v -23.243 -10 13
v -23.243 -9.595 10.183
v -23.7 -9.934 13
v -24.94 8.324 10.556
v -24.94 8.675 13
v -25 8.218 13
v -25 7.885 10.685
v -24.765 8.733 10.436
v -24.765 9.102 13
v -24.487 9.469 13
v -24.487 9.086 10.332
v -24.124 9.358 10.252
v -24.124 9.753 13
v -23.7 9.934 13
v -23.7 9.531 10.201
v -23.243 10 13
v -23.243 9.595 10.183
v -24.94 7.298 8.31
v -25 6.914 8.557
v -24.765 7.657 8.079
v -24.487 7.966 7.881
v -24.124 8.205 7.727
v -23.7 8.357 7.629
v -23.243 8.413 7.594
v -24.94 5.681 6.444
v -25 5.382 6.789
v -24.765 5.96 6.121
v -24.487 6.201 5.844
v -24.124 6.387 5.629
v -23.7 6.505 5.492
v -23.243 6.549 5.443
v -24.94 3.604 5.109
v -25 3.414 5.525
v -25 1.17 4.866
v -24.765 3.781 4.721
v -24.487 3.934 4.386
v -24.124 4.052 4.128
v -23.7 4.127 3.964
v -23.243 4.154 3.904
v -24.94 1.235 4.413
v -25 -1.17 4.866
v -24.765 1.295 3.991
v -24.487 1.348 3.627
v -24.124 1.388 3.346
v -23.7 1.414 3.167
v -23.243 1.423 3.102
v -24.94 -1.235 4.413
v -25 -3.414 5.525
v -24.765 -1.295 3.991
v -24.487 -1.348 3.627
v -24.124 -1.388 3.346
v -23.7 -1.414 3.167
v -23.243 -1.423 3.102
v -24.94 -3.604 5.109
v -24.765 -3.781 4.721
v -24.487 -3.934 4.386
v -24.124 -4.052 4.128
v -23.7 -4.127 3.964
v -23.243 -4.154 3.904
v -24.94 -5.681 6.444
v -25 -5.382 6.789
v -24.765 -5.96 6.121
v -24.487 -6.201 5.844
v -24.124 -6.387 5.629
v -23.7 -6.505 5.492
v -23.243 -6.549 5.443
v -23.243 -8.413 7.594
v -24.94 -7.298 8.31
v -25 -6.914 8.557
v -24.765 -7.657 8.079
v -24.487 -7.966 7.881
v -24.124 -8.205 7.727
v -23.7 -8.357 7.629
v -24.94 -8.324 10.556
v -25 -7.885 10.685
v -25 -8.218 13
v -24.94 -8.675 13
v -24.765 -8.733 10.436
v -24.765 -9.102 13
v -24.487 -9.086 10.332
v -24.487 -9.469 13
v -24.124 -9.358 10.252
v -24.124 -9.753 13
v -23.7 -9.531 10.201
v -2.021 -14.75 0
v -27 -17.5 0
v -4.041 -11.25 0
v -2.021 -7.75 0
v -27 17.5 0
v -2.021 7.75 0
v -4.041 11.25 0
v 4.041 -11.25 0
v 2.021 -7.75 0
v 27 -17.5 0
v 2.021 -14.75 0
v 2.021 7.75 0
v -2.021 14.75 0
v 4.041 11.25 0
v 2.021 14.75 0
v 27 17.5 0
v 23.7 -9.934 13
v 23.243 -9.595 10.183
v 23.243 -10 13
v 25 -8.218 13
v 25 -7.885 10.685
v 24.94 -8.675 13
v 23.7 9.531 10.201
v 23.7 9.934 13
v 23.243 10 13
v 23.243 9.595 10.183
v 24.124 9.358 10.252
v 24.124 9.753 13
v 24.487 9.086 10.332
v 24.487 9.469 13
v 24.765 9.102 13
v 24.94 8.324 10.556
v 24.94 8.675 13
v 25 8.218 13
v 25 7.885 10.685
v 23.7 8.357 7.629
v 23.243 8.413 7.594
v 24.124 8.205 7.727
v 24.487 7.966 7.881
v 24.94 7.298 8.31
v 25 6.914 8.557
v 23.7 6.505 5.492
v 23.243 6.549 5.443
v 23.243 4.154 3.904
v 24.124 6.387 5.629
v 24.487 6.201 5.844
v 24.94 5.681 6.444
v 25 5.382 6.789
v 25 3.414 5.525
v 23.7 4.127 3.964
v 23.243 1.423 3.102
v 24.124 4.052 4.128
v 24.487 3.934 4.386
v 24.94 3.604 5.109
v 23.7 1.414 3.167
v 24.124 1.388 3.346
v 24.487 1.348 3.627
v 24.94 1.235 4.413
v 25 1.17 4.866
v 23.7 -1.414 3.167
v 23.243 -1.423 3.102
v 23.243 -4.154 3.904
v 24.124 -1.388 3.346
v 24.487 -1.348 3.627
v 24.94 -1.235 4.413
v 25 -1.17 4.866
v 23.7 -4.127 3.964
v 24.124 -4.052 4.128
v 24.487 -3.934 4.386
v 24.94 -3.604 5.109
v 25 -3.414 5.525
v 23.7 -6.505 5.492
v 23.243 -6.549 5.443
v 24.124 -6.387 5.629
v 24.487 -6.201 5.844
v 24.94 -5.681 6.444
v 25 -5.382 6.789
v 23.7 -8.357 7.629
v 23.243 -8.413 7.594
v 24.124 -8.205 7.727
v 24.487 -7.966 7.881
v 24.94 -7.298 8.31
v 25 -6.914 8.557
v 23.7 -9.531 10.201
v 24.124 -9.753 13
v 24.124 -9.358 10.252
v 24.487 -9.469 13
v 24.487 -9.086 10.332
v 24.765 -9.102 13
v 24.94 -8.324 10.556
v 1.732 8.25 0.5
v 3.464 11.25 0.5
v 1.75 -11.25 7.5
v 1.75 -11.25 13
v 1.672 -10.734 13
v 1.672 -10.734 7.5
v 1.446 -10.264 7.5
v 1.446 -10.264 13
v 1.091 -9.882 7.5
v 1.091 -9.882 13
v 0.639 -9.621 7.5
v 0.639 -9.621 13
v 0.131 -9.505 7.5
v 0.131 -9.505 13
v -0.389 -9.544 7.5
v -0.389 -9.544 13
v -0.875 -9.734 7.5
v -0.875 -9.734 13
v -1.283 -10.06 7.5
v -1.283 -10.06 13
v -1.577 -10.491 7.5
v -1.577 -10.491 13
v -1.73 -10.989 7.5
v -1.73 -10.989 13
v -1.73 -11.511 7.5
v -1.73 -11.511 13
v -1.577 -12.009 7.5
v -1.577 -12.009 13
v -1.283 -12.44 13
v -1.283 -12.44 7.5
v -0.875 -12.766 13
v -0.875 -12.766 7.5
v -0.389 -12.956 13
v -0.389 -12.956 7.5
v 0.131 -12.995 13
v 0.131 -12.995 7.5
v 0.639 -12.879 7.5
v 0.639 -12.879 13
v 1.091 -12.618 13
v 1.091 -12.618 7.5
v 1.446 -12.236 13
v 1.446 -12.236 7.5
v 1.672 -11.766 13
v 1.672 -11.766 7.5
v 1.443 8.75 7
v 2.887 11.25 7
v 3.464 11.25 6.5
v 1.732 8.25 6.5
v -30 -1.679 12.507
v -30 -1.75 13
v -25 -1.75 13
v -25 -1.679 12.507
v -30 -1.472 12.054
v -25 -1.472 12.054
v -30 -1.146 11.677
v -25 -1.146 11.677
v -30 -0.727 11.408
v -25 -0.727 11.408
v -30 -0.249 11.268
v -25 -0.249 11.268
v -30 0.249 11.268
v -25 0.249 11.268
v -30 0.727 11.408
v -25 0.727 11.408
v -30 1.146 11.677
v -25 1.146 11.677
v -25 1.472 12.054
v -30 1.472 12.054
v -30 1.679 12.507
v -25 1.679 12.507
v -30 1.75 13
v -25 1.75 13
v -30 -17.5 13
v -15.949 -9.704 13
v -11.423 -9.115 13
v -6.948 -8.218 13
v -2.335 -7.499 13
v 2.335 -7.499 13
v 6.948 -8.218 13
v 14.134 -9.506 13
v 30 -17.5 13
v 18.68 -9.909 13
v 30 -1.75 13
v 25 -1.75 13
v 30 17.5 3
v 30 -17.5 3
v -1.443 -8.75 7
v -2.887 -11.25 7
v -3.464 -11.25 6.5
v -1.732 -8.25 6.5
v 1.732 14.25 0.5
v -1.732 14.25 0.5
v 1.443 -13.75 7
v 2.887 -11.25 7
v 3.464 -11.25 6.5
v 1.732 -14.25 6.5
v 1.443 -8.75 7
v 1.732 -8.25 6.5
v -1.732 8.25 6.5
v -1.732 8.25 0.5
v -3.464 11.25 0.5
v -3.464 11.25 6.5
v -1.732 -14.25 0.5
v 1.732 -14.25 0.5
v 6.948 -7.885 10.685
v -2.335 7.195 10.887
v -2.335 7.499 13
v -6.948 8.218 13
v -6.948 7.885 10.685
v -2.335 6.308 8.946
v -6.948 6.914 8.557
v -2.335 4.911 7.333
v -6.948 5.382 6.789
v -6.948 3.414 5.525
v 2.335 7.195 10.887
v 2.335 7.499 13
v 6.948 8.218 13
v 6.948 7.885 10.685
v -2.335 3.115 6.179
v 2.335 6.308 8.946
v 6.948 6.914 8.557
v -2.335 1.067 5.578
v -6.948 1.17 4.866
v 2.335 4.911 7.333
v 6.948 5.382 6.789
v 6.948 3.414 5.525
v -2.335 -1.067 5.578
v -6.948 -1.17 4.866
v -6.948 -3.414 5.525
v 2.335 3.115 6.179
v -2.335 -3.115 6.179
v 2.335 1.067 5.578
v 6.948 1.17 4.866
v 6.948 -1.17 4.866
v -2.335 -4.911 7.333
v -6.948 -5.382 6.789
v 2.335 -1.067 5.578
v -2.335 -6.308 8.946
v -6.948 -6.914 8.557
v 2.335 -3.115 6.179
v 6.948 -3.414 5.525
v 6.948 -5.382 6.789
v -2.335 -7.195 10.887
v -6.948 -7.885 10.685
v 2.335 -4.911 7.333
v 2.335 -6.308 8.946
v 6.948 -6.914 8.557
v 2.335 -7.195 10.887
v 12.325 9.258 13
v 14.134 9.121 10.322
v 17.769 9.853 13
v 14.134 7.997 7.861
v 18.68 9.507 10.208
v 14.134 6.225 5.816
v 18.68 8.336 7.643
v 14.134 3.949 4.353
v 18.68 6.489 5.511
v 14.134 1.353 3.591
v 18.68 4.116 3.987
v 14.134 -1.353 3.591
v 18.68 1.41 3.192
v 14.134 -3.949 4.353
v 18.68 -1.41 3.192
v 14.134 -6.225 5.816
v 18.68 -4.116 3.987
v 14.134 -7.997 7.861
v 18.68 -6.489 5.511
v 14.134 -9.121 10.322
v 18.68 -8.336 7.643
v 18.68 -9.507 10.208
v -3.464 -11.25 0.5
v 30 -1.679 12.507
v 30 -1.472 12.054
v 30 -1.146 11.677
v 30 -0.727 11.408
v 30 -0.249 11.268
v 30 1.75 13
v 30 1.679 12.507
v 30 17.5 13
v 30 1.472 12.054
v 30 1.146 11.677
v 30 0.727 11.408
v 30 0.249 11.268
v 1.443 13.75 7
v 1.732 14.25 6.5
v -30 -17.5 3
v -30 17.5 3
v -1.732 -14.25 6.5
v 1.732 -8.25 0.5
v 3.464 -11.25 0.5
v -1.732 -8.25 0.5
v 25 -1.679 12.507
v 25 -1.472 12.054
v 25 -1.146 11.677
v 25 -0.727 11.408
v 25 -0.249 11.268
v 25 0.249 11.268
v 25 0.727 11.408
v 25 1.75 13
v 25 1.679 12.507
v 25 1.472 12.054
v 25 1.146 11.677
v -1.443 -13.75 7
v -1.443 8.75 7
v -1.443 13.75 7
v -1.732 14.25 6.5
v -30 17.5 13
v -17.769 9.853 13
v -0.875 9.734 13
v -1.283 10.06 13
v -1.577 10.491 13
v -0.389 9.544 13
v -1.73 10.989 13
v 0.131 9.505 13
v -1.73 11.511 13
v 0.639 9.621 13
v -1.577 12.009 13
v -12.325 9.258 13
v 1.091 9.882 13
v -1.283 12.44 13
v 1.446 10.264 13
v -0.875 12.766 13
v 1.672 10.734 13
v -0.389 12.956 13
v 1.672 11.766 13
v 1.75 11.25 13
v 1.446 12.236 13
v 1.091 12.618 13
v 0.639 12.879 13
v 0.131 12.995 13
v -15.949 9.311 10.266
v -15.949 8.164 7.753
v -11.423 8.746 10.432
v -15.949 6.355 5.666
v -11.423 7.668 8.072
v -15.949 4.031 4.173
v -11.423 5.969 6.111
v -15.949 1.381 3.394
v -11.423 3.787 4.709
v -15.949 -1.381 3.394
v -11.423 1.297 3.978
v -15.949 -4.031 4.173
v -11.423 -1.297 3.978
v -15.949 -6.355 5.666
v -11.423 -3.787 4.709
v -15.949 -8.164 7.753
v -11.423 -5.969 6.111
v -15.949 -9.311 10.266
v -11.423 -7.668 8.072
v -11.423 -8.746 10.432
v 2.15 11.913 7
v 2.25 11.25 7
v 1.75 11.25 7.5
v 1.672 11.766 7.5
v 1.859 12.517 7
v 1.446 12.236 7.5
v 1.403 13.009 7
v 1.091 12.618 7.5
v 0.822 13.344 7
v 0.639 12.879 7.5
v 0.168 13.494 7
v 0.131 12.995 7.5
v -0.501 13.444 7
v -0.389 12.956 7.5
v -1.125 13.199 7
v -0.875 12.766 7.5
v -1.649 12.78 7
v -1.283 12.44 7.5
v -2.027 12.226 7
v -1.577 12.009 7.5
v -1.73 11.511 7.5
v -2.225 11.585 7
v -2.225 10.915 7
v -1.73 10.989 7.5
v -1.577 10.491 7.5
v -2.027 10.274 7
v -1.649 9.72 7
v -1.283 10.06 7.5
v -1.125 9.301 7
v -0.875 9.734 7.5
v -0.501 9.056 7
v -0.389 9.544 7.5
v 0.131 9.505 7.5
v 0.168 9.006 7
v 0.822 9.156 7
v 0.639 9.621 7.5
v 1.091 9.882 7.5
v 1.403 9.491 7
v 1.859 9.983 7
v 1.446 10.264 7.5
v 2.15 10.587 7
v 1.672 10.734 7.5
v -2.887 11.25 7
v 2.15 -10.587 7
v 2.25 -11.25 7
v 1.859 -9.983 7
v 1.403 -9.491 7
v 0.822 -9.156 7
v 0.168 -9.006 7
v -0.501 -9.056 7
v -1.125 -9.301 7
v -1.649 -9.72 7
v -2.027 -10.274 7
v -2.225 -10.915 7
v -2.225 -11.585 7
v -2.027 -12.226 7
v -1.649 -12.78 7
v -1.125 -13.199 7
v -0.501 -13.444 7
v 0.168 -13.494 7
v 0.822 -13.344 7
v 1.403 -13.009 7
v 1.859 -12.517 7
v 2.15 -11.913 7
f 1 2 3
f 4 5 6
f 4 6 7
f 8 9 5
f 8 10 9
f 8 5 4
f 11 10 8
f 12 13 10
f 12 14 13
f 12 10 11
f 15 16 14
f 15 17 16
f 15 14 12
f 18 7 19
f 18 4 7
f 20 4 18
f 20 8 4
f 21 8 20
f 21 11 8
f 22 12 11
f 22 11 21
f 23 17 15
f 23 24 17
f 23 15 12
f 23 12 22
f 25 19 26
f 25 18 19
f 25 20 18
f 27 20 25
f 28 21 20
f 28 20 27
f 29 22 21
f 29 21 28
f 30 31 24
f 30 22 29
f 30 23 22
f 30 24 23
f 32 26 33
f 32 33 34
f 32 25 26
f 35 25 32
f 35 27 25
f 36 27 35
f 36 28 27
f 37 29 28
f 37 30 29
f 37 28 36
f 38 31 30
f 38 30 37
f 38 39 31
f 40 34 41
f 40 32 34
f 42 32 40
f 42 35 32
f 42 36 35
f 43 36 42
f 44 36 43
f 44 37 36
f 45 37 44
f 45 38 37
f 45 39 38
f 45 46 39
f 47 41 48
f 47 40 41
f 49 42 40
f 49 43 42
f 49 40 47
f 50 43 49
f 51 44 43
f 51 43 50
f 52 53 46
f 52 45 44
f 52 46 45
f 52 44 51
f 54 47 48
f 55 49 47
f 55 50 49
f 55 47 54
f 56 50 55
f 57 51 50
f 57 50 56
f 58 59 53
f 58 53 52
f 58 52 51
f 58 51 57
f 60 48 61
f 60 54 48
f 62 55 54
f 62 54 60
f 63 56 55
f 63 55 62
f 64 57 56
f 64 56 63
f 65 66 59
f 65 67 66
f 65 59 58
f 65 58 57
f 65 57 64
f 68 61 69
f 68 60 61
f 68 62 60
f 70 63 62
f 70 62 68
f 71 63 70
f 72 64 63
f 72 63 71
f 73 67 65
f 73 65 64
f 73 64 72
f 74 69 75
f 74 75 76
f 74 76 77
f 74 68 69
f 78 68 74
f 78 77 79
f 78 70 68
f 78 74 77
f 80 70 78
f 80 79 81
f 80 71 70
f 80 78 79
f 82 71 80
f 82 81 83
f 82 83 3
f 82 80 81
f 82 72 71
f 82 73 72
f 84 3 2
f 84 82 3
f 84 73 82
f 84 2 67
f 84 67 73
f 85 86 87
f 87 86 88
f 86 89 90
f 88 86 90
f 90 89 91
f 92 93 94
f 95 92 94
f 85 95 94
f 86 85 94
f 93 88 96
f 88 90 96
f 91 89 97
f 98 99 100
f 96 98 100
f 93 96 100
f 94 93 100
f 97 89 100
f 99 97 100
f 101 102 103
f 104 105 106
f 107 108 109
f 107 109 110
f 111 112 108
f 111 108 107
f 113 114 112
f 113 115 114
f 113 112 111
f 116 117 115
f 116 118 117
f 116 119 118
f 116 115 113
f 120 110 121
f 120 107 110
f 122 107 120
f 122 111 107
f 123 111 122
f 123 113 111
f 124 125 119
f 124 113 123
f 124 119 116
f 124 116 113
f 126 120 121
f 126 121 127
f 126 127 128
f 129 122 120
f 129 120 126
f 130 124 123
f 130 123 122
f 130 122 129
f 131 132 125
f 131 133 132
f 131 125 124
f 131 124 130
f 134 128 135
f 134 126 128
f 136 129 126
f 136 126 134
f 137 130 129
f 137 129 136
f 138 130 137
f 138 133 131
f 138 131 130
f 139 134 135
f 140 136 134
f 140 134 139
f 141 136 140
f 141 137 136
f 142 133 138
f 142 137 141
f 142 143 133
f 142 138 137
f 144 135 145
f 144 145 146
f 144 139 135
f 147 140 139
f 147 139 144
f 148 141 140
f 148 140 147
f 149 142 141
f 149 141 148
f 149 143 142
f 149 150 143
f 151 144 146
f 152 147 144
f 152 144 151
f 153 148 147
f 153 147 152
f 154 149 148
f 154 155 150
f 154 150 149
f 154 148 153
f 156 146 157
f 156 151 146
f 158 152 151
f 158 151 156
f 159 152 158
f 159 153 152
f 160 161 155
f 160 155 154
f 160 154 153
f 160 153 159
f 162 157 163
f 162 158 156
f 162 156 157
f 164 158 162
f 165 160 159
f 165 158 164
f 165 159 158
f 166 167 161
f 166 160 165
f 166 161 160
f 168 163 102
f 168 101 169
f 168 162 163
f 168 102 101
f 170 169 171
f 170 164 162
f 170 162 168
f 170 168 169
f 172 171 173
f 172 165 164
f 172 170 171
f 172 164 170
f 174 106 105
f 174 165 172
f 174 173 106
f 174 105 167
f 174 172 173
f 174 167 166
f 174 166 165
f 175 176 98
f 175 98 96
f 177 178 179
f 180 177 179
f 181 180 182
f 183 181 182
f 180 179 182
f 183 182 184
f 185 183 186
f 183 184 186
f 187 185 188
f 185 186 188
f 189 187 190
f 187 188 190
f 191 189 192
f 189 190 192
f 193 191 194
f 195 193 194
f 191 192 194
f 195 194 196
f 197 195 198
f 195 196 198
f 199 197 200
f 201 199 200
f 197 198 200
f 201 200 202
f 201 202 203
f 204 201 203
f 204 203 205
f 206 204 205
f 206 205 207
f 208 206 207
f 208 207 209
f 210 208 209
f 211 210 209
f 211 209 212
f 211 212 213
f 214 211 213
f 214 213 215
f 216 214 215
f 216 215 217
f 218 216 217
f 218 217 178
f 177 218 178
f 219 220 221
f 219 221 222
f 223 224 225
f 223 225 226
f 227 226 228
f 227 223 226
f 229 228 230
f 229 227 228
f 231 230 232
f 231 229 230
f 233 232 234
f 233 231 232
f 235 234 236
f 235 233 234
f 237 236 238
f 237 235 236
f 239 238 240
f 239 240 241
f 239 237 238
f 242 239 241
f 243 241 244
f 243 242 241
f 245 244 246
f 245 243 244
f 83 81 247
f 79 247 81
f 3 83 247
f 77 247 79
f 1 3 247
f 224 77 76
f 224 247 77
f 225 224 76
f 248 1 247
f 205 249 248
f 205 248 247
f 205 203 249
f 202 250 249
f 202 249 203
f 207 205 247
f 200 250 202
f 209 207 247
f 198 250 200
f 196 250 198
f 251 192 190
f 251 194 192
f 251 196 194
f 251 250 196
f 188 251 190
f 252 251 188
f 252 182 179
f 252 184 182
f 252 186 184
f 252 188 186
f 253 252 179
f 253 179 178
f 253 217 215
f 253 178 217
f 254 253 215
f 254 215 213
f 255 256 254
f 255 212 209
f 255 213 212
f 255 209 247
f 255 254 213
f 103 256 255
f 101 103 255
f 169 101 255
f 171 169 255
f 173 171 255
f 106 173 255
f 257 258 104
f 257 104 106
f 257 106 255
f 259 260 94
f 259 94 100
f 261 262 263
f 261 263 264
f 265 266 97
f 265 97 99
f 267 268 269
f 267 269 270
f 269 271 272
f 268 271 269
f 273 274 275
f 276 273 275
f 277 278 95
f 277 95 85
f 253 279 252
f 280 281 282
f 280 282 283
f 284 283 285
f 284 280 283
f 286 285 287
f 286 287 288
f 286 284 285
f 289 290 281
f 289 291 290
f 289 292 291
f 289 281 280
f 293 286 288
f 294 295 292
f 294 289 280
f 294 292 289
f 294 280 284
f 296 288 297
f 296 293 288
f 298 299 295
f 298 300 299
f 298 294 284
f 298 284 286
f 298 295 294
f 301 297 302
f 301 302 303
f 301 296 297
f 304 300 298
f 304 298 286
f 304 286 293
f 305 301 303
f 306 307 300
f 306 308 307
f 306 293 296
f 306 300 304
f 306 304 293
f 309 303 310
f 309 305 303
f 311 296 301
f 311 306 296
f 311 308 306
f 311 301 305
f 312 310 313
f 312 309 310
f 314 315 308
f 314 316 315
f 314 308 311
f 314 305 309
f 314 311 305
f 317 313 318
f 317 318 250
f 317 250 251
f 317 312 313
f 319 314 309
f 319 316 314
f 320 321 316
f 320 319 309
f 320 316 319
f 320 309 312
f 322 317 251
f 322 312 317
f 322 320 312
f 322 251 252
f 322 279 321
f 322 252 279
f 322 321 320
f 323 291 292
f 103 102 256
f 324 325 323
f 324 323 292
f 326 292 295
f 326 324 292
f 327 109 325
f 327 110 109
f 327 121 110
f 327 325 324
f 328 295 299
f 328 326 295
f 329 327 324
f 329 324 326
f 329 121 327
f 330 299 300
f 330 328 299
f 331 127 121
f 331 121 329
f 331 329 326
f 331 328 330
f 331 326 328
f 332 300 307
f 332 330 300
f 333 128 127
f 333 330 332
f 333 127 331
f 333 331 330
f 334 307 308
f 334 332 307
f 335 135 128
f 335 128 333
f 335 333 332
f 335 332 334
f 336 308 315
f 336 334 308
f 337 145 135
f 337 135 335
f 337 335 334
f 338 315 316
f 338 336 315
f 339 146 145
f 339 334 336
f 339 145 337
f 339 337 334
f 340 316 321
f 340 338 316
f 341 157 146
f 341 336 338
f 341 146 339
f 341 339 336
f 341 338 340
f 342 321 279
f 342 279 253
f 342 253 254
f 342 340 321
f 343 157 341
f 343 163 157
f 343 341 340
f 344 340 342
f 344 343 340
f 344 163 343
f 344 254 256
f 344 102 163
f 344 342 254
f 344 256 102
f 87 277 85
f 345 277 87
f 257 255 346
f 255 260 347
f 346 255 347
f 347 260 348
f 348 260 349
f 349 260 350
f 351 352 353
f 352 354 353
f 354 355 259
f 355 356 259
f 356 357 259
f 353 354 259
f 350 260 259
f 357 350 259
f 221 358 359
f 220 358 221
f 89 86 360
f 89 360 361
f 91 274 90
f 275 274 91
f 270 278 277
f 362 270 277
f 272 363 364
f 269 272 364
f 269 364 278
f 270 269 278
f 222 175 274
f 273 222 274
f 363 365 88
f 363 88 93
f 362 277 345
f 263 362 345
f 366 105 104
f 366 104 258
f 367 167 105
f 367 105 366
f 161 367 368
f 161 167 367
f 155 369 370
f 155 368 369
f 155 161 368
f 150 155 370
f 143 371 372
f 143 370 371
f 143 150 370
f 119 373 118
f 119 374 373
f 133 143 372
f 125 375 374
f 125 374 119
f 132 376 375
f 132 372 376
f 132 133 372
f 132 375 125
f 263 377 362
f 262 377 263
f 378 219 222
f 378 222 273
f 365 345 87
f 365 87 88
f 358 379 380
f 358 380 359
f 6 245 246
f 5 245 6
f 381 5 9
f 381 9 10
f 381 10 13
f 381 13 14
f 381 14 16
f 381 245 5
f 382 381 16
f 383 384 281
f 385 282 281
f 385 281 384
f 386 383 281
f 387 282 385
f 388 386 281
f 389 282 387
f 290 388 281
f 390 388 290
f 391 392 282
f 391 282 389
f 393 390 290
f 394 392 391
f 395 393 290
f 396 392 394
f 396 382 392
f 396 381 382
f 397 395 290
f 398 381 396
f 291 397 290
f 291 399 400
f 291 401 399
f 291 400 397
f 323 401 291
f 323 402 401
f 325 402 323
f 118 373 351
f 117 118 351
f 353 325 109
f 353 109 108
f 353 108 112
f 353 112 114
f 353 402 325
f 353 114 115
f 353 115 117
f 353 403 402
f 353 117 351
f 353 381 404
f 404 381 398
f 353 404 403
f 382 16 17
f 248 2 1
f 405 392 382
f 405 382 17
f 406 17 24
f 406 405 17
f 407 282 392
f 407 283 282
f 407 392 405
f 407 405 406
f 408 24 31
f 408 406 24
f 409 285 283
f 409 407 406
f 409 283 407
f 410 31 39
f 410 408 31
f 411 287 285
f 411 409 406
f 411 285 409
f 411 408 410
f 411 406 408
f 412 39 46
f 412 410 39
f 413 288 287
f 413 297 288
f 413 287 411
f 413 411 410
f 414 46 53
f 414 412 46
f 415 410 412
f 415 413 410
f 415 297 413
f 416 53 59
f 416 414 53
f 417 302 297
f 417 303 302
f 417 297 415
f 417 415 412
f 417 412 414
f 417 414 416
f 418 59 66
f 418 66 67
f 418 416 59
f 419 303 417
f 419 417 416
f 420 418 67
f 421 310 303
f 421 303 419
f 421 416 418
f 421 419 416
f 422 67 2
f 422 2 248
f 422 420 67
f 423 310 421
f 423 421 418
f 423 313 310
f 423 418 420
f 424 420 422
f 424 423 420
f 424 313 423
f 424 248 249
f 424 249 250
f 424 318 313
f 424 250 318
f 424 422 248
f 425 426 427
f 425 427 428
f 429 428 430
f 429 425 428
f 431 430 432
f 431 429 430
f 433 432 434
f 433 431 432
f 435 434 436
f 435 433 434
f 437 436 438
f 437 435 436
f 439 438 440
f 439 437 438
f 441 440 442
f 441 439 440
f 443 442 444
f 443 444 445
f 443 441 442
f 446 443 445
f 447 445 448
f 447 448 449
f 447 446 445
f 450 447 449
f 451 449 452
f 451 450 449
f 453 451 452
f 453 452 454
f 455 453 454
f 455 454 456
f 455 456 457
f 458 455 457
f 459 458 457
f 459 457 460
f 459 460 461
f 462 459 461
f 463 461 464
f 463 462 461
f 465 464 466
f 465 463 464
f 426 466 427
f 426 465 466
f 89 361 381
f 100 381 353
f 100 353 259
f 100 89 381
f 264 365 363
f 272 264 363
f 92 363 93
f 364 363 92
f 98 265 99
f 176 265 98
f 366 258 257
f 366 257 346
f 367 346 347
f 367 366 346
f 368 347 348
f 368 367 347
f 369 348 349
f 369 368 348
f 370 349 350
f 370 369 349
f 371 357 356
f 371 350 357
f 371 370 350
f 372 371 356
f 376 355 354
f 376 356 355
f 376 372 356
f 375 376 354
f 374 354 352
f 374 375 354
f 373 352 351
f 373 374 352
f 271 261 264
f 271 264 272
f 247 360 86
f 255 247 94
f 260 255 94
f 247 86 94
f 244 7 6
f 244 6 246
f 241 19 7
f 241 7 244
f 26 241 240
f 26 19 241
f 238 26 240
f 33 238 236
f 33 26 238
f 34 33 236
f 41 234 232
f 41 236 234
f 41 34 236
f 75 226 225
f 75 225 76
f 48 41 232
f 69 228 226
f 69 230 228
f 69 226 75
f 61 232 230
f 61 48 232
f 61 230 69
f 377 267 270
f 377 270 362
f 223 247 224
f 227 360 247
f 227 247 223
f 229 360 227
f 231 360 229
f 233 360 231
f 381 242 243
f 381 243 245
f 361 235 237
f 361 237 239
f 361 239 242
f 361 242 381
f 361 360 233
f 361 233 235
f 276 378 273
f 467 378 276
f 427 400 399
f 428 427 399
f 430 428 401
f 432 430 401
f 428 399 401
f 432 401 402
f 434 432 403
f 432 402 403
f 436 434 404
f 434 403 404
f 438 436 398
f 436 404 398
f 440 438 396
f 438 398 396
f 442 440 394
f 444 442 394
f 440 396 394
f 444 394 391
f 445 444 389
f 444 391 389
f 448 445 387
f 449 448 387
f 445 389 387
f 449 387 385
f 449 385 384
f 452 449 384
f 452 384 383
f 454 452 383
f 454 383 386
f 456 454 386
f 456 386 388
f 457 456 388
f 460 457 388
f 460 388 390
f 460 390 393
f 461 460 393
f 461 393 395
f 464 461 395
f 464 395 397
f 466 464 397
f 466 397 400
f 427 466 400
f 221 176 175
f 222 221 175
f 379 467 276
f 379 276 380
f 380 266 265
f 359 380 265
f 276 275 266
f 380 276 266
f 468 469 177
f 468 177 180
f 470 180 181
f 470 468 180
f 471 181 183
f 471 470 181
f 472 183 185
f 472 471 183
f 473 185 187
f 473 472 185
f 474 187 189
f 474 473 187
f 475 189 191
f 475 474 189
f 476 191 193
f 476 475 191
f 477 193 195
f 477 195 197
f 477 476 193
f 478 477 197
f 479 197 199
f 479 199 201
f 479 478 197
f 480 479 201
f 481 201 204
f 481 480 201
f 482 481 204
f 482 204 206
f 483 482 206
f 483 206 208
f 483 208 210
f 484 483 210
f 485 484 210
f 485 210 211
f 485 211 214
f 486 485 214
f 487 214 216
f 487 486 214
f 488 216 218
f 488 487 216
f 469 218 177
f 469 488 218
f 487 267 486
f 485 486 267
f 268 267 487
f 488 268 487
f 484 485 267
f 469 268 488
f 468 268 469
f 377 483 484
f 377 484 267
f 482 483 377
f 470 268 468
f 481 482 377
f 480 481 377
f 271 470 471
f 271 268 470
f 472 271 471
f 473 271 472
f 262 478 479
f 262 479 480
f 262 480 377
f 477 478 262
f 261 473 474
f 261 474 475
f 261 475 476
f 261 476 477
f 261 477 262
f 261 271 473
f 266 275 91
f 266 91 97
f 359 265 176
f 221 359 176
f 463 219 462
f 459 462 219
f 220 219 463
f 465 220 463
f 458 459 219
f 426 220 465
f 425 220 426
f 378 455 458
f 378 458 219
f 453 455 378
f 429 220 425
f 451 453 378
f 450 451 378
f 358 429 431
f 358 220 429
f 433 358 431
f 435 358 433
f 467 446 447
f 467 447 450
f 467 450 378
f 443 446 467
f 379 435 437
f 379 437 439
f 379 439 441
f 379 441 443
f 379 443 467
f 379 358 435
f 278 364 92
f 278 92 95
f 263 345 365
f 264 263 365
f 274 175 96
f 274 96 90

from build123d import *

# Parameters (mm, degrees)
SKETCH1_W               = 60
SKETCH1_H               = 35
BOSS_EXTRUDE1_DEPTH     = 13
CUT_EXTRUDE1_DEPTH      = 64.837684937
CUT_EXTRUDE1_DEPTH_BACK = 64.837684937
SKETCH3_R               = 1.75
SKETCH5_R               = 1.75
CUT_EXTRUDE3_DEPTH      = 38.08436341
CHAMFER1_SIZE           = 3
CUT_EXTRUDE4_DEPTH      = 7
CHAMFER2_SIZE           = 0.5


with BuildPart() as part:
    # Sketch1 → Boss-Extrude1 (new body)
    with BuildSketch(Plane.XY):
        Rectangle(SKETCH1_W, SKETCH1_H)
    extrude(amount=BOSS_EXTRUDE1_DEPTH)

    # Sketch2 → Cut-Revolve1 (revolve, cut)
    with BuildSketch(Plane.XY.offset(13)):
        with BuildLine():
            Line((-25, 0), (-25, 8.218127455))
            ThreePointArc((-25, 8.218127455), (-24.486963528, 9.469250598), (-23.243251097, 10))
            ThreePointArc((-23.243251097, 10), (-15.040879193, 9.611248064), (-6.94833646, 8.218127455))
            ThreePointArc((-6.94833646, 8.218127455), (0, 7.408356031), (6.94833646, 8.218127455))
            ThreePointArc((6.94833646, 8.218127455), (15.040879193, 9.611248064), (23.243251097, 10))
            ThreePointArc((23.243251097, 10), (24.486963528, 9.469250598), (25, 8.218127455))
            Line((25, 8.218127455), (25, 0))
            Line((25, 0), (-25, 0))
        make_face()
    revolve(axis=Axis((25, 0, 13), (-1, 0, 0)), mode=Mode.SUBTRACT)

    # Sketch3 → Cut-Extrude1 (cut, two sides: drawn at the far end of the back side and taken through both)
    with BuildSketch(Plane(origin=(30, 0, 0), x_dir=(0, 0, -1), z_dir=(1, 0, 0)).offset(-CUT_EXTRUDE1_DEPTH_BACK)):
        with Locations((-13, 0)):
            Circle(SKETCH3_R)
    extrude(amount=CUT_EXTRUDE1_DEPTH + CUT_EXTRUDE1_DEPTH_BACK, mode=Mode.SUBTRACT)

    # Sketch5 → Cut-Extrude3 (cut, through all)
    with BuildSketch(Plane.XY.offset(13)):
        with Locations((0, 11.25)):
            Circle(SKETCH5_R)
        with Locations((0, -11.25)):
            Circle(SKETCH5_R)
    extrude(amount=-CUT_EXTRUDE3_DEPTH, mode=Mode.SUBTRACT)

    # Chamfer1
    chamfer1_edges = [part.edges().sort_by_distance(p)[0] for p in [
        (-30, 0, 0),
        (30, 0, 0),
    ]]
    chamfer(chamfer1_edges, length=CHAMFER1_SIZE)

    # Sketch6 → Cut-Extrude4 (cut)
    with BuildSketch(Plane(origin=(0, 0, 0), x_dir=(-1, 0, 0), z_dir=(0, 0, -1))):
        Polygon((3.464101615, 11.25), (1.732050808, 14.25), (-1.732050808, 14.25), (-3.464101615, 11.25), (-1.732050808, 8.25), (1.732050808, 8.25), align=None)
        Polygon((3.464101615, -11.25), (1.732050808, -8.25), (-1.732050808, -8.25), (-3.464101615, -11.25), (-1.732050808, -14.25), (1.732050808, -14.25), align=None)
    extrude(amount=-CUT_EXTRUDE4_DEPTH, mode=Mode.SUBTRACT)

    # Chamfer2
    chamfer2_edges = [part.edges().sort_by_distance(p)[0] for p in [
        (-2.598076211, 9.75, 0),
        (-2.598076211, 12.75, 0),
        (0, 14.25, 0),
        (2.598076211, 12.75, 0),
        (2.598076211, 9.75, 0),
        (0, 8.25, 0),
        (-2.598076211, 9.75, 7),
        (0, 8.25, 7),
        (2.598076211, 9.75, 7),
        (2.598076211, 12.75, 7),
        (0, 14.25, 7),
        (-2.598076211, 12.75, 7),
        (-1.75, 11.25, 7),
        (-2.598076211, -12.75, 0),
        (-2.598076211, -9.75, 0),
        (0, -8.25, 0),
        (2.598076211, -9.75, 0),
        (2.598076211, -12.75, 0),
        (0, -14.25, 0),
        (-2.598076211, -12.75, 7),
        (0, -14.25, 7),
        (2.598076211, -12.75, 7),
        (2.598076211, -9.75, 7),
        (0, -8.25, 7),
        (-2.598076211, -9.75, 7),
        (-1.75, -11.25, 7),
    ]]
    chamfer(chamfer2_edges, length=CHAMFER2_SIZE)


solid = part.part
